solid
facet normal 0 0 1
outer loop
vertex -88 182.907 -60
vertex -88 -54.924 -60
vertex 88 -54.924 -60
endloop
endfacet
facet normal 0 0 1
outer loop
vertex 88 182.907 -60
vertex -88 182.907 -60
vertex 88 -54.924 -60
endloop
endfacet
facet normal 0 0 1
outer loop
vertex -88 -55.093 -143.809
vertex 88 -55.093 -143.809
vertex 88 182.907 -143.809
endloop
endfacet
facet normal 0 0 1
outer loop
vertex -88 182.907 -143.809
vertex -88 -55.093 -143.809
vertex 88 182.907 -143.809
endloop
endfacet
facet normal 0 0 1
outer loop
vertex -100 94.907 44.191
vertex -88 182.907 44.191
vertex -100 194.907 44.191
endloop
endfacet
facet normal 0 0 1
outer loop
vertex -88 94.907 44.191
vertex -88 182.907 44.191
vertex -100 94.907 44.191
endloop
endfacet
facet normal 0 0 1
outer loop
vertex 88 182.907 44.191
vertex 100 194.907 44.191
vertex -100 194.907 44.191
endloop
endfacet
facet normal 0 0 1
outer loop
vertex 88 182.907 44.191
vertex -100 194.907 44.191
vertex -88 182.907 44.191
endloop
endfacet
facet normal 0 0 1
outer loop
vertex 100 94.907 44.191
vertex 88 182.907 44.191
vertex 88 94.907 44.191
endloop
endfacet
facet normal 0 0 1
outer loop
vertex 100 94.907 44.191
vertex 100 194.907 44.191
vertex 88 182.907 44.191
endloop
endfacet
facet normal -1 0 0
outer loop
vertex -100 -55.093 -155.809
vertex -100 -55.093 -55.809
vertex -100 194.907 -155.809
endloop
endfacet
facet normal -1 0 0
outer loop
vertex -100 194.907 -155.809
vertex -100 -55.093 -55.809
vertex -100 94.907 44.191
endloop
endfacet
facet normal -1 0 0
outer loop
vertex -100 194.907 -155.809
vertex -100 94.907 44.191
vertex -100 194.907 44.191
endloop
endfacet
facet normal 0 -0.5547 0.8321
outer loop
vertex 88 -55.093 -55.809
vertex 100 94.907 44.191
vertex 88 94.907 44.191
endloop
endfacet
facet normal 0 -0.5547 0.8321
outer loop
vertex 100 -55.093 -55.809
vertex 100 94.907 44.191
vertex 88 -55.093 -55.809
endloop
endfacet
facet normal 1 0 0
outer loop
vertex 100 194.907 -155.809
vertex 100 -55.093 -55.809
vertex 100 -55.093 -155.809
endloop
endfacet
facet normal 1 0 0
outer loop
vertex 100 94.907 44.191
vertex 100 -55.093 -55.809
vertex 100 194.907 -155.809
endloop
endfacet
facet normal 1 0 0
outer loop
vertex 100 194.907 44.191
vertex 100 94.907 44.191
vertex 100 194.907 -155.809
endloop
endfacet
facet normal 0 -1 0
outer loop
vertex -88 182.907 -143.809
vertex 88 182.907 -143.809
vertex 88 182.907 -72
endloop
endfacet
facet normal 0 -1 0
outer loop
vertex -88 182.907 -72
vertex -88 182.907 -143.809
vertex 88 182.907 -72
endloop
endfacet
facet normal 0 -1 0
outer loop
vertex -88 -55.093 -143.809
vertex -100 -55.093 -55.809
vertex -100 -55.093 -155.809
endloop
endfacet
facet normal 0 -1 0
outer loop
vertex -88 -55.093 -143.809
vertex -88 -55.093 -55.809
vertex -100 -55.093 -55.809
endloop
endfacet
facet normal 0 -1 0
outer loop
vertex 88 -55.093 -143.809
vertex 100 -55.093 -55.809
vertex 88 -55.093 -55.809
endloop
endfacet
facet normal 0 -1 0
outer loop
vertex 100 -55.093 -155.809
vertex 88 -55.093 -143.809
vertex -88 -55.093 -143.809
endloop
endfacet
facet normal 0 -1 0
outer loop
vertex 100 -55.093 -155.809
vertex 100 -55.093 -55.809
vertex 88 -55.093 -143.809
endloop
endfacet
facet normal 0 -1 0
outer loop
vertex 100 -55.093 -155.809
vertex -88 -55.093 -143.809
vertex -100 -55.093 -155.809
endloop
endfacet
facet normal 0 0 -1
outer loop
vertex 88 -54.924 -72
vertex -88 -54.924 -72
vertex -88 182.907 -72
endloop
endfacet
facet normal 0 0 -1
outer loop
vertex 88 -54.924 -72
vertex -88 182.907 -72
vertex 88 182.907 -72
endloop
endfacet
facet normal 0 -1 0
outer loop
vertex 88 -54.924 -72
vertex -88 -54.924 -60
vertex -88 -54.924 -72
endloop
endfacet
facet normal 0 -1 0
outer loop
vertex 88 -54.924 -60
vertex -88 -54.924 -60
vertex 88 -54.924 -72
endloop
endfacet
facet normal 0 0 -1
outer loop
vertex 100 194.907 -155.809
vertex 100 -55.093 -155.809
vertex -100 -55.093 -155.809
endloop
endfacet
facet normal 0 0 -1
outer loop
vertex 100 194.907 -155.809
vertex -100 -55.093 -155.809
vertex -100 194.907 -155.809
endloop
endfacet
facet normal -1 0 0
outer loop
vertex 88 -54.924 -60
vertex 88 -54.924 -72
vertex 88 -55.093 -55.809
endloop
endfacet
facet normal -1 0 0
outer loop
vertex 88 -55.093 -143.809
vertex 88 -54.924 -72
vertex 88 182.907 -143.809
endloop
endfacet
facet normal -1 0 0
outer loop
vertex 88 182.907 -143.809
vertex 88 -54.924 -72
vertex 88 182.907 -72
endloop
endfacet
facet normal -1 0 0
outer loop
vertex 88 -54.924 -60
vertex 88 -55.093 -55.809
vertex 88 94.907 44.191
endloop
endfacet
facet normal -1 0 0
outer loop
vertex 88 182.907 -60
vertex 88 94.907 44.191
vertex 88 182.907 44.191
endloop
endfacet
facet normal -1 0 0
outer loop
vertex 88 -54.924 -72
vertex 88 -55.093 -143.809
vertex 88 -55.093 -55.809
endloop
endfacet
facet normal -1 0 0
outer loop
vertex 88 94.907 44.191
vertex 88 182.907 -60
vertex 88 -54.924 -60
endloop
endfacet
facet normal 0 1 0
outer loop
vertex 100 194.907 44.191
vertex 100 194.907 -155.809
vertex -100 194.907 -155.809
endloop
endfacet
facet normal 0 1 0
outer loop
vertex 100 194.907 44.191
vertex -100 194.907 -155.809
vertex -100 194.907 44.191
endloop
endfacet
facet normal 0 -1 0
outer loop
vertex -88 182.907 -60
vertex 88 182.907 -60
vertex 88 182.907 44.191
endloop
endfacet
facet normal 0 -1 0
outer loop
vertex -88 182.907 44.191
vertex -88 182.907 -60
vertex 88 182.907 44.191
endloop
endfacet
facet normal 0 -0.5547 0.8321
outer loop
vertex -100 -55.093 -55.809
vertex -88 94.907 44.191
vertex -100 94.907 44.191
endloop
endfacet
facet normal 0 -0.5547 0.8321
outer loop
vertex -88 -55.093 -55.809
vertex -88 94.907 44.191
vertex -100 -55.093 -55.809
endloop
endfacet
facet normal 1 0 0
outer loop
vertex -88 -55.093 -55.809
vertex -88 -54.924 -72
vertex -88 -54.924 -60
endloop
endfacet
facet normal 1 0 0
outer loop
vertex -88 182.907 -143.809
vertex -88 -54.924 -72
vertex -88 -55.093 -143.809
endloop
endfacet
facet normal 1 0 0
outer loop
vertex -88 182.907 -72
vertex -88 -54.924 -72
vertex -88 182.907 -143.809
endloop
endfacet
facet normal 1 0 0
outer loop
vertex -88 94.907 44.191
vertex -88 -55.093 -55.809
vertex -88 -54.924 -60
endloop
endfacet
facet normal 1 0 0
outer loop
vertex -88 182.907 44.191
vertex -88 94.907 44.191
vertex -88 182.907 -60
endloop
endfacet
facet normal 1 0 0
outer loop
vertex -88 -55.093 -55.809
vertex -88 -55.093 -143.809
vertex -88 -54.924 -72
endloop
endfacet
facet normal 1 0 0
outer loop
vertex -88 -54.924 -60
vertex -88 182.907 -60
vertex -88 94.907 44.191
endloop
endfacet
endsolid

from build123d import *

# Parameters (mm, degrees)
F1_DEPTH = 100
F2_T     = -12
F4_W     = 182.326324
F4_H     = 241.805934
F5_DEPTH = 12


with BuildPart() as f1:
    # F0 (on Right) → F1 (new body, symmetric)
    with BuildSketch(Plane.YZ):
        Polygon((-55.092596, -55.808697), (-55.092596, -155.808697), (194.907404, -155.808697), (194.907404, 44.191303), (94.907404, 44.191303), align=None)
    extrude(amount=F1_DEPTH, both=True)

    # F2
    f2_openings = [f1.faces().sort_by_distance(p)[0] for p in [
        (0, 144.907404, 44.191303),
        (0, 19.907404, -5.808697),
        (0, -55.092596, -105.808697),
    ]]
    offset(amount=F2_T, openings=f2_openings)

    # F4 (on offset) → F5 (join)
    with BuildSketch(Plane.XY.offset(-60)):
        with Locations((0.583131, 65.97941)):
            Rectangle(F4_W, F4_H)
    extrude(amount=-F5_DEPTH)


solid = f1.part
